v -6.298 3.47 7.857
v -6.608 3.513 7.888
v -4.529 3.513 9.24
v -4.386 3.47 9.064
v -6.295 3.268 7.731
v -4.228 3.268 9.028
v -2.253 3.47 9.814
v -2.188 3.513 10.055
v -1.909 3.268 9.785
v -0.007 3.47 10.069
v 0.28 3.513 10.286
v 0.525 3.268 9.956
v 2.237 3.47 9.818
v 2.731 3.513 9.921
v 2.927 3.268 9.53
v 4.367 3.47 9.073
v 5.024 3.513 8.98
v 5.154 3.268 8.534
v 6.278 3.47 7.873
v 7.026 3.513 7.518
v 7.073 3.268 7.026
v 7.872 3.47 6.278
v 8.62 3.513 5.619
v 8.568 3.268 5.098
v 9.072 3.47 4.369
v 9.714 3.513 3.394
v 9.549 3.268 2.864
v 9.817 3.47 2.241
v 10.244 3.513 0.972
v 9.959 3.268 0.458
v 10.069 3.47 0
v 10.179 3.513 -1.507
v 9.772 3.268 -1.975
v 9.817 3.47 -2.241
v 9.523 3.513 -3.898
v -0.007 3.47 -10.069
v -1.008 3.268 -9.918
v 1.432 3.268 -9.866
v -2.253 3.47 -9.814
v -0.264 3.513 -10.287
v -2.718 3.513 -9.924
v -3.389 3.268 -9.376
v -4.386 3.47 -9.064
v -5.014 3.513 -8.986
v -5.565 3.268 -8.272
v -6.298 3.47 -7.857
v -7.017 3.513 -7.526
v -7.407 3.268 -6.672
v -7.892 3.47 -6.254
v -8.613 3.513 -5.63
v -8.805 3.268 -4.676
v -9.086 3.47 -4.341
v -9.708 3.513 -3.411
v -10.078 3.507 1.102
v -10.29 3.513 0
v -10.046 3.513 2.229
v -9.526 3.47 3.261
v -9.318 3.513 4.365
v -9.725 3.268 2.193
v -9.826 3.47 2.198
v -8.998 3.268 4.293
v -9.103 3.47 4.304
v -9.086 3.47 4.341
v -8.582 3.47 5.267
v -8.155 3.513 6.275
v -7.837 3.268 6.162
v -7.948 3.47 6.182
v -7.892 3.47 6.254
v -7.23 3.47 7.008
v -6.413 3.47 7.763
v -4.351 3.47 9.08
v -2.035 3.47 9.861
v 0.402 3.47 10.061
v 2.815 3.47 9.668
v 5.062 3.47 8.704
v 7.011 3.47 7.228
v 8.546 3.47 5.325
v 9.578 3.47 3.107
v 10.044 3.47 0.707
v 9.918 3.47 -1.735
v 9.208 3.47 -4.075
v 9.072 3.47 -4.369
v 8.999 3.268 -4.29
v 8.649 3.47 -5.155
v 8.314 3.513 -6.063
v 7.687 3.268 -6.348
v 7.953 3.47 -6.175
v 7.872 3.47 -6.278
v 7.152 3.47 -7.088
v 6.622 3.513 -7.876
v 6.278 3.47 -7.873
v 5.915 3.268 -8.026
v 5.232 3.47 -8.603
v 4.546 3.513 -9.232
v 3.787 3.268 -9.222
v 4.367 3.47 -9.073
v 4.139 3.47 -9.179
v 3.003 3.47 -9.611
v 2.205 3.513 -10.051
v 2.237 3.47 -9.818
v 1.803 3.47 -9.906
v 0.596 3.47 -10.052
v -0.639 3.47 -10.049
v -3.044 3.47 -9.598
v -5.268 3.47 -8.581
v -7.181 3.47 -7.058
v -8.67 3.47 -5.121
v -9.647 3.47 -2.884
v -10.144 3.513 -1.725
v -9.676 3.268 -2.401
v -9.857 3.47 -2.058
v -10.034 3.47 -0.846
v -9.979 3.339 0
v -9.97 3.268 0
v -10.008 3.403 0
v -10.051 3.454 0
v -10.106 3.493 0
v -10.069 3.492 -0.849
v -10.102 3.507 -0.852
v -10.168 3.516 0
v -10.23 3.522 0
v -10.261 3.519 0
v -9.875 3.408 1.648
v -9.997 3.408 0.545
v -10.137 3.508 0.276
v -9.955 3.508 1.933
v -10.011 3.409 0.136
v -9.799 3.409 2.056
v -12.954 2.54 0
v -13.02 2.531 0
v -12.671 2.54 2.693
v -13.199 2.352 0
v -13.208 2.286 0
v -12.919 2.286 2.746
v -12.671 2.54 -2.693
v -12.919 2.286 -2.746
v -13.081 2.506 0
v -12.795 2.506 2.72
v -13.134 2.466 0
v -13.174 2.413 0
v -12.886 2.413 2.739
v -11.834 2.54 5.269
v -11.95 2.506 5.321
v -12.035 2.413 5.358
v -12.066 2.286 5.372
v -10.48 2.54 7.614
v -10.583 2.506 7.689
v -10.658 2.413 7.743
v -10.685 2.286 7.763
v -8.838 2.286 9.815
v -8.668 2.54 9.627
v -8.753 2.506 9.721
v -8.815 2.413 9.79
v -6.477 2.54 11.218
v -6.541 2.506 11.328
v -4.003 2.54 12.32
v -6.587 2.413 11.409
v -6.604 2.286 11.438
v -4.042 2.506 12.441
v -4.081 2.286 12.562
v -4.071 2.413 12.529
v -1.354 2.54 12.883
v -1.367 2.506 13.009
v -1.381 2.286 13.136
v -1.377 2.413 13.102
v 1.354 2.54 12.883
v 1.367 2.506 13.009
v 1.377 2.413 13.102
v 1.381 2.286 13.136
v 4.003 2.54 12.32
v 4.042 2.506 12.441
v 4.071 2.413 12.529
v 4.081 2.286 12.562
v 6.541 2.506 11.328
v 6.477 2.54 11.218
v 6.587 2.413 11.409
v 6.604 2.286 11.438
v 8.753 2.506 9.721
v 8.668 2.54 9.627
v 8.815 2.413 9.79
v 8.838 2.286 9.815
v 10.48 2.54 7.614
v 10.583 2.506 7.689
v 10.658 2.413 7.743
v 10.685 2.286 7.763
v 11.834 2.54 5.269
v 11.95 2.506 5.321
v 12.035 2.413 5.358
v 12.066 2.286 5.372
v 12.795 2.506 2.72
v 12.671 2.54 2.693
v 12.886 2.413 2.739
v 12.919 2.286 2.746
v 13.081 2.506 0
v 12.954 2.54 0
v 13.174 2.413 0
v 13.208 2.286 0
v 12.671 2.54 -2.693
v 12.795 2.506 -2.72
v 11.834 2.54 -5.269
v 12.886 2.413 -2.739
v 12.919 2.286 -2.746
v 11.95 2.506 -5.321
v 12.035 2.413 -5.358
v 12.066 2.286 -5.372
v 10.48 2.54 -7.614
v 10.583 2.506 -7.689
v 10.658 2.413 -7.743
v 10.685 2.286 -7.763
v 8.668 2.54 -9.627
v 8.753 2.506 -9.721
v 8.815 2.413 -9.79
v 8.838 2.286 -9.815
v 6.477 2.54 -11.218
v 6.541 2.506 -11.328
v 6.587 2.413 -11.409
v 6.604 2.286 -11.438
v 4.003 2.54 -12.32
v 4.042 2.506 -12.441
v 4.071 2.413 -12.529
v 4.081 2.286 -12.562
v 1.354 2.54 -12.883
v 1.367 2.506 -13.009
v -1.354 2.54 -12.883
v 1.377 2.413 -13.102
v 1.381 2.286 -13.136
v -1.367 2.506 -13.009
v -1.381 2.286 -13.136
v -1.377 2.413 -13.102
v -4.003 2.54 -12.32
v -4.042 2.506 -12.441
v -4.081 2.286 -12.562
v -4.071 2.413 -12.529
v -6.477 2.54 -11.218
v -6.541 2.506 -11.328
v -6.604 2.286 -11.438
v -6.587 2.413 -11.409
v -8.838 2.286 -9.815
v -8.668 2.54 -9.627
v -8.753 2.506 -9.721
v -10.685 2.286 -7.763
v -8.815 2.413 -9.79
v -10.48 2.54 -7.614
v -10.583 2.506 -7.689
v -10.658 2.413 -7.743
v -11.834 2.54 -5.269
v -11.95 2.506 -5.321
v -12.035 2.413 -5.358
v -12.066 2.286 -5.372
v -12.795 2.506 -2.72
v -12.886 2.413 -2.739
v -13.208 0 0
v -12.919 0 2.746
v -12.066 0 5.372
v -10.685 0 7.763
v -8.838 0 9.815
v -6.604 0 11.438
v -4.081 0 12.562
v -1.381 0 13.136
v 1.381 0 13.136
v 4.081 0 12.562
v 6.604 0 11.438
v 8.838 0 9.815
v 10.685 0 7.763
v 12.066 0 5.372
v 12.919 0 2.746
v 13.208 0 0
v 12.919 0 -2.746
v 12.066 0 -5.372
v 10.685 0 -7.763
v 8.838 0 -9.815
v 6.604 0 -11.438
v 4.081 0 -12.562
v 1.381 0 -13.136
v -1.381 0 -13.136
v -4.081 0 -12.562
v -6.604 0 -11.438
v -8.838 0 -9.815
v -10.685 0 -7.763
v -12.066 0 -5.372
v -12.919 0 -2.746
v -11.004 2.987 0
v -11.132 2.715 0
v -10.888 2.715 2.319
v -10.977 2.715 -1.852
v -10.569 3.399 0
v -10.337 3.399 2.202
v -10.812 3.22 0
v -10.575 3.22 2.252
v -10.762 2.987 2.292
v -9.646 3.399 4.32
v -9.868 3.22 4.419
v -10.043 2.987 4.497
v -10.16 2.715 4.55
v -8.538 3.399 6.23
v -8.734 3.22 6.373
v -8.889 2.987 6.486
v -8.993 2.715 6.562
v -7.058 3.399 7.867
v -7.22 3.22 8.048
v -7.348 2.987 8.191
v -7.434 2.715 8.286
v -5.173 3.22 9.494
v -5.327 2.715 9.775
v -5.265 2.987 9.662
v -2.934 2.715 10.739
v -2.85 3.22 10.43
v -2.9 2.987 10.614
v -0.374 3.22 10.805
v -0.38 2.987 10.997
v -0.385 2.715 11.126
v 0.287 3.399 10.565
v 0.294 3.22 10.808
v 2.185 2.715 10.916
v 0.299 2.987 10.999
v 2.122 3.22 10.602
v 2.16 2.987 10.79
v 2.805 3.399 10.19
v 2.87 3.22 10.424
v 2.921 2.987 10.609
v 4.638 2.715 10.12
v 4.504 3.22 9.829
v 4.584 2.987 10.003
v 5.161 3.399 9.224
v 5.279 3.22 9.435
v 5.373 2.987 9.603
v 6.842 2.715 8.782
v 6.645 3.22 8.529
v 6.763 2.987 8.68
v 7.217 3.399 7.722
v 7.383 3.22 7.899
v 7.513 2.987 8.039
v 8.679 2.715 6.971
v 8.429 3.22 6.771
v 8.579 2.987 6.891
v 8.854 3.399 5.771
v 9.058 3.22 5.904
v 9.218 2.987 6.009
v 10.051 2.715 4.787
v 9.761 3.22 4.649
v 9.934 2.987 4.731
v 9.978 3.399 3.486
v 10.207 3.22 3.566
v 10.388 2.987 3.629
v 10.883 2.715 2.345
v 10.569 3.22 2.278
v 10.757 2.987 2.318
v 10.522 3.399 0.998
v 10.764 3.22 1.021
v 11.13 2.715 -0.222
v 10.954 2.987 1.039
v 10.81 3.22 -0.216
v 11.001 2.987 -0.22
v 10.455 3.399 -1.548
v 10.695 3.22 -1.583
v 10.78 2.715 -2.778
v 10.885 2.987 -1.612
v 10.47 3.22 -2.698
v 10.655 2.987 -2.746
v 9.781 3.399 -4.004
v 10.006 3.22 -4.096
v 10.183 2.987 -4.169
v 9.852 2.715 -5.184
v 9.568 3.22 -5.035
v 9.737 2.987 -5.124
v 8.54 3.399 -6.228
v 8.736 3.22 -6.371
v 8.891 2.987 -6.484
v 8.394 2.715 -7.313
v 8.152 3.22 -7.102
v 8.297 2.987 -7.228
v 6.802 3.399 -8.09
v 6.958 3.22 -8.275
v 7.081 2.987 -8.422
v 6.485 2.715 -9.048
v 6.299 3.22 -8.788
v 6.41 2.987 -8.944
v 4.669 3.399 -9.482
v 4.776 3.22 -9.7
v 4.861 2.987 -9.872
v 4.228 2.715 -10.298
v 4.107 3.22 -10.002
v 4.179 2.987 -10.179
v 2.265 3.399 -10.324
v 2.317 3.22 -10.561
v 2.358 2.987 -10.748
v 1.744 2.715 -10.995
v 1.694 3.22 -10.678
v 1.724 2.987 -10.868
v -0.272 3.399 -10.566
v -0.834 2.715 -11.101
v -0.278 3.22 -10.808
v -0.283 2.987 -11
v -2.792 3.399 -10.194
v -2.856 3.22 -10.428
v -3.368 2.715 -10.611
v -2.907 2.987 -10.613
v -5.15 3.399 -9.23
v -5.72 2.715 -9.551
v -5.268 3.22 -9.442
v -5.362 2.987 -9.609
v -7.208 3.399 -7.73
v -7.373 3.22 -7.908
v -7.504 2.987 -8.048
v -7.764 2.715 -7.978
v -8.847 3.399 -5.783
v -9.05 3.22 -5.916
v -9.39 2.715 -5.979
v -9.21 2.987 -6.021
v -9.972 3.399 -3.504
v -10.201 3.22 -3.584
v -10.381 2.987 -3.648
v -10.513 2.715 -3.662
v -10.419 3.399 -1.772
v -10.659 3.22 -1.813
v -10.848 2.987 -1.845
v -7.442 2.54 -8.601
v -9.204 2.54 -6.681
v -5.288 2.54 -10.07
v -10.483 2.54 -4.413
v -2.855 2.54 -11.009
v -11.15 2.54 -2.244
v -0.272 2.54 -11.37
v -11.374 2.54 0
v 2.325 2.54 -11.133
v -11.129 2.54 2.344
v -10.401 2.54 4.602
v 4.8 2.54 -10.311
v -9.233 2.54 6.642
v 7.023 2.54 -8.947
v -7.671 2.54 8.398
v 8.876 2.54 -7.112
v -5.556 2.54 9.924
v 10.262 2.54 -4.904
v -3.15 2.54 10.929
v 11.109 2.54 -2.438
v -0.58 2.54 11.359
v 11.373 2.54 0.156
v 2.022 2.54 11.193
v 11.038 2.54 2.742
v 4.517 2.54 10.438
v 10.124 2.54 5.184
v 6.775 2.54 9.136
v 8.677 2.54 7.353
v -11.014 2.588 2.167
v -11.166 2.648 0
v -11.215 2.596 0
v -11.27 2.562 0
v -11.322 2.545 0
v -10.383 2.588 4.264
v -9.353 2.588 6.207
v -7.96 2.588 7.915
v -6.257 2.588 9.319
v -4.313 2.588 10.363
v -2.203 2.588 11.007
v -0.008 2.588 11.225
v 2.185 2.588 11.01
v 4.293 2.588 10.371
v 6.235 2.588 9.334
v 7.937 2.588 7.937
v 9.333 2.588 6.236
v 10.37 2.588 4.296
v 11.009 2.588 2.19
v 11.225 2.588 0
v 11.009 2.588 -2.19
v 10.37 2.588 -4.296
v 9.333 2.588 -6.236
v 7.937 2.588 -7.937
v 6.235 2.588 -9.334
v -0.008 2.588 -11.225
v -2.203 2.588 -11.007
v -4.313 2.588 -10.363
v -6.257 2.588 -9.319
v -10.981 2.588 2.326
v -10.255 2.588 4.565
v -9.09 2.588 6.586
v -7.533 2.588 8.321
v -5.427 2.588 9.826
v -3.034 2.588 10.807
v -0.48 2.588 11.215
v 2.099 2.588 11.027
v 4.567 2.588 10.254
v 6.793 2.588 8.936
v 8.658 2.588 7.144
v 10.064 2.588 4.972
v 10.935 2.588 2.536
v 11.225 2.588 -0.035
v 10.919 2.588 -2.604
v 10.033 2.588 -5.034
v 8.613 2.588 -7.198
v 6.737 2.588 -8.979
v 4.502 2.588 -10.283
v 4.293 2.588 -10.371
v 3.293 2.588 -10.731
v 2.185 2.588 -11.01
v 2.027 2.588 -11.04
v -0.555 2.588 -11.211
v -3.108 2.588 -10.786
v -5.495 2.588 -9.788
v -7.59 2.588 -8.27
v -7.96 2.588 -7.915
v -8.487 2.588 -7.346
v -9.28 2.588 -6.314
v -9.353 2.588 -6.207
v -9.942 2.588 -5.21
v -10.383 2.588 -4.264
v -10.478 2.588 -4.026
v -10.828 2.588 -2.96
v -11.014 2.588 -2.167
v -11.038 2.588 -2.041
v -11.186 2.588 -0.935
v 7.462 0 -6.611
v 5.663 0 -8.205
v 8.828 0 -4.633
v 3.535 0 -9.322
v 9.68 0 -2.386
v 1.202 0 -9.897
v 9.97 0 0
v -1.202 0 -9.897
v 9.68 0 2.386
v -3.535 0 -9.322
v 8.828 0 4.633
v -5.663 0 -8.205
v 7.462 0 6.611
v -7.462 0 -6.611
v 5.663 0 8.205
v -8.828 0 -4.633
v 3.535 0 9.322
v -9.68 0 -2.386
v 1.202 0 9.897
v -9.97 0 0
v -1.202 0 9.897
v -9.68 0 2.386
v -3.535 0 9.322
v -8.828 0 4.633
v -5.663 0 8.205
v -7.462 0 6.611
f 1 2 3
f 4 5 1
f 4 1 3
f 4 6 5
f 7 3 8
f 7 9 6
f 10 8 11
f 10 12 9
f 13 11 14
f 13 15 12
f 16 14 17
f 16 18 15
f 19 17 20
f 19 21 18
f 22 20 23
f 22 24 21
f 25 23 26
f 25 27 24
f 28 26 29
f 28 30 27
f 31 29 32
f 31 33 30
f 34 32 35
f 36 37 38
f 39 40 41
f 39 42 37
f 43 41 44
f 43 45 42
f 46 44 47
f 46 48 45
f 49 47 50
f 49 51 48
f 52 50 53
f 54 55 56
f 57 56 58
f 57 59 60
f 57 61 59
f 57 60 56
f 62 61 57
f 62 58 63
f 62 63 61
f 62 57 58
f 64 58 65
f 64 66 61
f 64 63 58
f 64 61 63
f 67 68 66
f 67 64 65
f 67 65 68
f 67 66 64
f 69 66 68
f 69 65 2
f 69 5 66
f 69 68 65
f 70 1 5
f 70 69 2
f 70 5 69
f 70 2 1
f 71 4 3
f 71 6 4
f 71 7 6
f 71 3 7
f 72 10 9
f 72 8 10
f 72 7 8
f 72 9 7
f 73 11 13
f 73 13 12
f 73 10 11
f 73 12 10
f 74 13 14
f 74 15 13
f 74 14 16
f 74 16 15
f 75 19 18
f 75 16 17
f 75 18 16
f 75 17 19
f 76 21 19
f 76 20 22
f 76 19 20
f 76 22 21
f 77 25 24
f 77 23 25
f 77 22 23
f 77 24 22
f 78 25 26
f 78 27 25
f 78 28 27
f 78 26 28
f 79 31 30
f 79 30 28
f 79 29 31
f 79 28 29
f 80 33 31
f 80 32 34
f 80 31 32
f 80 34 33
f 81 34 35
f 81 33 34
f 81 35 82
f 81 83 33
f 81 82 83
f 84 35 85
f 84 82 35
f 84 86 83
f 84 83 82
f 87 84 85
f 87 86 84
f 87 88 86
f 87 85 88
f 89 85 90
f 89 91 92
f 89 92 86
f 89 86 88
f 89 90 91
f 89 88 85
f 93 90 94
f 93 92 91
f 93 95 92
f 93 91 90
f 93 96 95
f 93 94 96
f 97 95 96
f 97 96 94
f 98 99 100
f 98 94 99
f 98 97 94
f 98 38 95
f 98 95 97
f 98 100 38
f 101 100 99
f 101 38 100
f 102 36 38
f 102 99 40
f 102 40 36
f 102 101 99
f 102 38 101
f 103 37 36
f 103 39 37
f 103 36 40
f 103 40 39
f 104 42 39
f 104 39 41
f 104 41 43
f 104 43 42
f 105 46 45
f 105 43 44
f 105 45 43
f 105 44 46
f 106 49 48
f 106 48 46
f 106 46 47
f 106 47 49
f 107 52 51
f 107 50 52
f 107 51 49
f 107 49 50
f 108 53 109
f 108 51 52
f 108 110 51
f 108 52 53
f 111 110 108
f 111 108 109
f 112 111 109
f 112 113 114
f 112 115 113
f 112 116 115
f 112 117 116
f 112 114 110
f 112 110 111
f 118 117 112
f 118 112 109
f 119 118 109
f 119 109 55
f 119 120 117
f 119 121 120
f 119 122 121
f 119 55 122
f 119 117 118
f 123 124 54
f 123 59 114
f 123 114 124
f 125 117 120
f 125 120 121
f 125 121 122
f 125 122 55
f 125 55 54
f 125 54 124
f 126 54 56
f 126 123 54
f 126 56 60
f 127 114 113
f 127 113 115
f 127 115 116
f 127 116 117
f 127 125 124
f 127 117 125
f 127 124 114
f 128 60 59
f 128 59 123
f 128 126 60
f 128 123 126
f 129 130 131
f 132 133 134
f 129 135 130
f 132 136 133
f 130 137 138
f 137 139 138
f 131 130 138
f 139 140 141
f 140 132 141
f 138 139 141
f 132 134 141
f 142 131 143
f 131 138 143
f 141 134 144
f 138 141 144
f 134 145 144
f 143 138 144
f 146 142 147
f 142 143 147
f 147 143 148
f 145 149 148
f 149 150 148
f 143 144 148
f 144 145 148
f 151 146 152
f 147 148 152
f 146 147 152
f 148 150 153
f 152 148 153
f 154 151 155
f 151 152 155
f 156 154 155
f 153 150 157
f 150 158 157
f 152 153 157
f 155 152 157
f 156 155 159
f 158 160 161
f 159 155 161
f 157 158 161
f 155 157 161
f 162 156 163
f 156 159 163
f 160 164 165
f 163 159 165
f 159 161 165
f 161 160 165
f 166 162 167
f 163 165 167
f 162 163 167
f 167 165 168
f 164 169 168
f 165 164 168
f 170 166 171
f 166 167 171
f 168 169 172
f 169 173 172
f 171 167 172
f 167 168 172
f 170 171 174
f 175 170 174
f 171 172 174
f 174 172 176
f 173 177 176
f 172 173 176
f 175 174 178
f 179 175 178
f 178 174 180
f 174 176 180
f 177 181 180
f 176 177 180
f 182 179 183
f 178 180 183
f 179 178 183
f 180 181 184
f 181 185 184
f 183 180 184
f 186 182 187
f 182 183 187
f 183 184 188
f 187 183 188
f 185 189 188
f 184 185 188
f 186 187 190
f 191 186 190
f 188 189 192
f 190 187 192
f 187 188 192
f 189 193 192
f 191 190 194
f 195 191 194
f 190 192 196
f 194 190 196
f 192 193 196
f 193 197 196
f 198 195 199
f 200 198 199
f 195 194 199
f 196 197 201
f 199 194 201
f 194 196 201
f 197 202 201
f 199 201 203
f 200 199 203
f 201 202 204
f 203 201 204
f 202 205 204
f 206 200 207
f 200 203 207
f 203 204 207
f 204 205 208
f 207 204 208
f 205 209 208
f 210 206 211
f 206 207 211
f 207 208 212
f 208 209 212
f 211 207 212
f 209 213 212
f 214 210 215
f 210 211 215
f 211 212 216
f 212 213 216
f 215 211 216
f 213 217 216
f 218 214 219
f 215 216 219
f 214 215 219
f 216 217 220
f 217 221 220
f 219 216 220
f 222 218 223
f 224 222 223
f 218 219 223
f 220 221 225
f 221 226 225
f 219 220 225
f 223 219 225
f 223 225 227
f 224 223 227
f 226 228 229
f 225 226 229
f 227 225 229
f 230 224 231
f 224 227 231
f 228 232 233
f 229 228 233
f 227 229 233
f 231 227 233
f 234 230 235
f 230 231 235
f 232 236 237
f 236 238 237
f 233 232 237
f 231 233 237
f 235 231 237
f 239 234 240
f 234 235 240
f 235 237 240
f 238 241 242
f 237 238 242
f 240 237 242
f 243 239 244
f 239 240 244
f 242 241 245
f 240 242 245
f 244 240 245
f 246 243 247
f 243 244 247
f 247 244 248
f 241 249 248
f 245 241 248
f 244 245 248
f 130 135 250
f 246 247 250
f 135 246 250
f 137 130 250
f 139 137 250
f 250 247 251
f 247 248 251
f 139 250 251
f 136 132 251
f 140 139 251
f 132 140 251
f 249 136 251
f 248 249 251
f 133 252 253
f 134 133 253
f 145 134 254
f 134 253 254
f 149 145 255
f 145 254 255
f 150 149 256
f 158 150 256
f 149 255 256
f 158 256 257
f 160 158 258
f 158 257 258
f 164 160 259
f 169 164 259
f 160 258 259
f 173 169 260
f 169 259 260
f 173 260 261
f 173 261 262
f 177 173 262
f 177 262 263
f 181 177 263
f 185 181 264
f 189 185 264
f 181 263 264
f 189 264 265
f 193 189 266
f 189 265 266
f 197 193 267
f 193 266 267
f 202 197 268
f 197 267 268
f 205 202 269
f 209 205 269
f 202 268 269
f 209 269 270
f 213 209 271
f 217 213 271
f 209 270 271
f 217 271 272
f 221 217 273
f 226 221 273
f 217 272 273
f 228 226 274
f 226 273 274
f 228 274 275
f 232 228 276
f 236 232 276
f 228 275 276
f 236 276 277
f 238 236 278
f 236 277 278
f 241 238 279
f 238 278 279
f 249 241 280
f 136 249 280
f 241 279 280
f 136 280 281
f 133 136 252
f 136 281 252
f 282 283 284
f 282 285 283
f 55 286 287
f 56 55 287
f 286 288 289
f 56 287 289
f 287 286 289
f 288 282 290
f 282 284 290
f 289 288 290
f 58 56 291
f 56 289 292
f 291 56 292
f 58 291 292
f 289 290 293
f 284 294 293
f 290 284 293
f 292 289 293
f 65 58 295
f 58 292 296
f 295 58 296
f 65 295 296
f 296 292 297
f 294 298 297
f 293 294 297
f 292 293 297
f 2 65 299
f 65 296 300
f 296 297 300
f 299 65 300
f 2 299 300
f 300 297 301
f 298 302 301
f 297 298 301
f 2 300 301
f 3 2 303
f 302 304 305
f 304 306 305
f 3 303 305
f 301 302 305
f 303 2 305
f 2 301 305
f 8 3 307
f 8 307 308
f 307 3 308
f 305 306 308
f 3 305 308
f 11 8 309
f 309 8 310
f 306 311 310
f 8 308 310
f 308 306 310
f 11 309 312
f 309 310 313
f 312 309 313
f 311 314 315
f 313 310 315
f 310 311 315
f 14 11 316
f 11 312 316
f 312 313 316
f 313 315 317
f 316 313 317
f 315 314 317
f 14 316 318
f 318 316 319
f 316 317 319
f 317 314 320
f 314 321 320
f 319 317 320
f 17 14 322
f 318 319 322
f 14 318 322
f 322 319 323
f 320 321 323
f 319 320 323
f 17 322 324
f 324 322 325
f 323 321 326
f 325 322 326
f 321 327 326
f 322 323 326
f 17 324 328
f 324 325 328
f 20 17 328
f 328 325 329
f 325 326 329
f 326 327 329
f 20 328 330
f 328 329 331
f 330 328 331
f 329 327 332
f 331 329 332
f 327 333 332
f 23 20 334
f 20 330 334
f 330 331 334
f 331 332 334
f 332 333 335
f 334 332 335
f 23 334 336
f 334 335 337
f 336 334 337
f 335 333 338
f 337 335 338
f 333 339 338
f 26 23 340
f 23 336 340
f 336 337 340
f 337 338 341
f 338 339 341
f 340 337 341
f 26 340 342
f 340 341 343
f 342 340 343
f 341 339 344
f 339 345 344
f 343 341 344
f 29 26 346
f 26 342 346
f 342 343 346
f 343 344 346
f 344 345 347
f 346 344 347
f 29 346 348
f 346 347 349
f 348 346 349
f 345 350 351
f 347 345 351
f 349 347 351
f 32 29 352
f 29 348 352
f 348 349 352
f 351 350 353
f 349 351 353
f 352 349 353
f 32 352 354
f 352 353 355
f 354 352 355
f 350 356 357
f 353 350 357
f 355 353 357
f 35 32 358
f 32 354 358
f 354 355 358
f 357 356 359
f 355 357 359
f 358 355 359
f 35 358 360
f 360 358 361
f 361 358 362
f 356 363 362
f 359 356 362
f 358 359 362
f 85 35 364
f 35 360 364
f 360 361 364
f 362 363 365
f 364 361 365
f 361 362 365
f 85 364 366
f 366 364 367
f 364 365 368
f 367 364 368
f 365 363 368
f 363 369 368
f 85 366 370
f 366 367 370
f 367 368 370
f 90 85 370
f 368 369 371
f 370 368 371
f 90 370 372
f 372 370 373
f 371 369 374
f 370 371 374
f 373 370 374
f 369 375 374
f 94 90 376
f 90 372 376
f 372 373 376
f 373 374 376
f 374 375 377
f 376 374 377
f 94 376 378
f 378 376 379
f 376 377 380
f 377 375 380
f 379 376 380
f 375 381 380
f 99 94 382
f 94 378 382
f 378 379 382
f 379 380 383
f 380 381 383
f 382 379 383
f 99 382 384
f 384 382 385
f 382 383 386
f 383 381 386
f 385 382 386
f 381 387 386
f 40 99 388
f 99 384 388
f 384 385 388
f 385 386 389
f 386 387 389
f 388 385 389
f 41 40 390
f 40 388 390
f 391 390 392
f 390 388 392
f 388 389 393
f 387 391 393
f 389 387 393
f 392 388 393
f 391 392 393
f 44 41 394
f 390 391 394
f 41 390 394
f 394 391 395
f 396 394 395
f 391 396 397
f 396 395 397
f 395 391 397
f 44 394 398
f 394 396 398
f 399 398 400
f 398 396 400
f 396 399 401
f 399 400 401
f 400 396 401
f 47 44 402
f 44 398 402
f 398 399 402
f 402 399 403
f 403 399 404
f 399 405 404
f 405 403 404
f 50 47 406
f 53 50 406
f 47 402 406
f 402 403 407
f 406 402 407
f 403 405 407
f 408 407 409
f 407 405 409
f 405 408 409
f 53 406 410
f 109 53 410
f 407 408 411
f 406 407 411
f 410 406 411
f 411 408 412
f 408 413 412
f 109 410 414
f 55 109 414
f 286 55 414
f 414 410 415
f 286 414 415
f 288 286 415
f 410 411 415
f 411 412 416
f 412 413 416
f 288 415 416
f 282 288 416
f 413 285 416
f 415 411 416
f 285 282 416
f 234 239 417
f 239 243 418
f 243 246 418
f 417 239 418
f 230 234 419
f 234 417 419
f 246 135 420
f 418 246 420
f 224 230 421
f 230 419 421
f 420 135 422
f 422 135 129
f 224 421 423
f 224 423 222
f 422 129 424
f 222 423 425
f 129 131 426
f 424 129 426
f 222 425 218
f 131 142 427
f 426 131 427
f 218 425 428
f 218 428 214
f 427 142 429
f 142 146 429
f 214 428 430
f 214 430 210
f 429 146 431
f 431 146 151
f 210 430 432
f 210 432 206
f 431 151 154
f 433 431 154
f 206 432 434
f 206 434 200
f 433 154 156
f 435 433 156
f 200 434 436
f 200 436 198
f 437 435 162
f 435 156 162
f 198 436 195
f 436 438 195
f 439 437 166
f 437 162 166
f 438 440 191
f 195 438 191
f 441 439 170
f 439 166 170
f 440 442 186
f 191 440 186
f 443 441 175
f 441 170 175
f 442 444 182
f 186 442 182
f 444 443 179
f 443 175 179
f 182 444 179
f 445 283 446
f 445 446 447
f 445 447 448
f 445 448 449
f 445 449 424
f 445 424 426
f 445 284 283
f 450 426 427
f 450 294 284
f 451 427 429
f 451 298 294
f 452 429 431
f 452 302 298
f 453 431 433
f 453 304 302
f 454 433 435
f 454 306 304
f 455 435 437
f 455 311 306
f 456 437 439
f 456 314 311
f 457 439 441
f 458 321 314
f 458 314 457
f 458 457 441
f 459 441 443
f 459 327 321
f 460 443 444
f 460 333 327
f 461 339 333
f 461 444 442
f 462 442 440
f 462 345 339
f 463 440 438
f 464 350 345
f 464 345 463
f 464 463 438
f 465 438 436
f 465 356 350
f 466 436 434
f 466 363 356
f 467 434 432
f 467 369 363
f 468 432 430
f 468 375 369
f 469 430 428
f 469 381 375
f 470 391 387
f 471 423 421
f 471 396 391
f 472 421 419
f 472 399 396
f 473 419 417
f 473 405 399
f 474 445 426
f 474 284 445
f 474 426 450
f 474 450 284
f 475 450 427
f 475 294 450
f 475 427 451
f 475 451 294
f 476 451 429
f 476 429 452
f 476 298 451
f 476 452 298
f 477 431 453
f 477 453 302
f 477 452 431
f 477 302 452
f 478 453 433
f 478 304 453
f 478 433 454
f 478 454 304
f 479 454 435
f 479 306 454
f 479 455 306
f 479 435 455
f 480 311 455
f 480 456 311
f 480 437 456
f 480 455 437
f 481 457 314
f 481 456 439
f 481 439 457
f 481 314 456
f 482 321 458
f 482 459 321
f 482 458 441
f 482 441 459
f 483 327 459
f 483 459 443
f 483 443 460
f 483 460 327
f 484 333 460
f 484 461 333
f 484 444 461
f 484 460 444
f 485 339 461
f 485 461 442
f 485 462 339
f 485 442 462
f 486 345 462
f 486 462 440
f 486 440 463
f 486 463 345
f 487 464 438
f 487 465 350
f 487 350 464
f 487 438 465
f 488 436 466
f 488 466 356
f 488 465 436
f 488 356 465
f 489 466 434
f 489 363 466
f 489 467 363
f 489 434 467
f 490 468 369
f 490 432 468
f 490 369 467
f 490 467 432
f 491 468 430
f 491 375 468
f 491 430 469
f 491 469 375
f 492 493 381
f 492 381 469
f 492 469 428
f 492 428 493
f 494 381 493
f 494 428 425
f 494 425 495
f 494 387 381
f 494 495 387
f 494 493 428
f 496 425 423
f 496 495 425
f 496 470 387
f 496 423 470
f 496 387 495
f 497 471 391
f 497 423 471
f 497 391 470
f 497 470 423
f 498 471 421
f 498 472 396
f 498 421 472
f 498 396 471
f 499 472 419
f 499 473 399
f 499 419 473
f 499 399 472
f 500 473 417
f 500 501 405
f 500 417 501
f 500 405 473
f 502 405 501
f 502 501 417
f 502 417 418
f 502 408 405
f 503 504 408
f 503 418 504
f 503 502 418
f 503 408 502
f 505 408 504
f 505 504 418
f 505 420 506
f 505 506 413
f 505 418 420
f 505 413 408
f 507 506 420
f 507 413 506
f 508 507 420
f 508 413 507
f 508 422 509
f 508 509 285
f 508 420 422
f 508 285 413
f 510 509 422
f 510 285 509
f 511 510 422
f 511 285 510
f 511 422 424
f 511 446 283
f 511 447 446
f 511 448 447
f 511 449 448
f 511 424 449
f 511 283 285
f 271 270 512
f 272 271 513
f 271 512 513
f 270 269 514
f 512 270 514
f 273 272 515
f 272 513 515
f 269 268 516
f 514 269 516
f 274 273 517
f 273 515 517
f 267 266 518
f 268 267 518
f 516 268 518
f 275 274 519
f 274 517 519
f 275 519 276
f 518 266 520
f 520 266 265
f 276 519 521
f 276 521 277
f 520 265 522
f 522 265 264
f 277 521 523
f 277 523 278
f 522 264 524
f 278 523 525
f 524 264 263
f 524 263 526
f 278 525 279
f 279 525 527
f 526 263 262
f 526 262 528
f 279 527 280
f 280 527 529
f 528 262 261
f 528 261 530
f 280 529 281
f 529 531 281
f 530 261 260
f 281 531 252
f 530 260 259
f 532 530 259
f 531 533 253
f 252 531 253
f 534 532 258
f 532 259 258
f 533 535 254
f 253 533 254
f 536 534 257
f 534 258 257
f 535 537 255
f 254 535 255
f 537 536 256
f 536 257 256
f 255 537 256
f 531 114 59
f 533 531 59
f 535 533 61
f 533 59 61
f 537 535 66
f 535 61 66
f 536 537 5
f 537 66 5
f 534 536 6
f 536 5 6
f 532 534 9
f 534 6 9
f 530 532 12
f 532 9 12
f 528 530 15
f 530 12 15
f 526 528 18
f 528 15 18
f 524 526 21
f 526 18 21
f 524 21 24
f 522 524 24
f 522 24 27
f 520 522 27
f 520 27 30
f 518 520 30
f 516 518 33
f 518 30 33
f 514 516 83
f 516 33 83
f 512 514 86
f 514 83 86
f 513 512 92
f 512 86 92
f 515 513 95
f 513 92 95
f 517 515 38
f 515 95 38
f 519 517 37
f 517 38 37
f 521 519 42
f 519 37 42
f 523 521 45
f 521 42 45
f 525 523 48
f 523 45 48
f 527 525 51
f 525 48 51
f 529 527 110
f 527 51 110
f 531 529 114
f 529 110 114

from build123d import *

# Parameters (mm, degrees)
FILLET1_R = 0.254


with BuildPart() as part:
    # Sketch1 → Revolve1 (revolve)
    with BuildSketch(Plane.XY):
        with BuildLine():
            Line((-9.9695, 0), (-9.9695, 3.556))
            ThreePointArc((-9.9695, 3.556), (-10.758153639, 3.268166821), (-11.176, 2.54))
            Line((-11.176, 2.54), (-13.208, 2.54))
            Line((-13.208, 2.54), (-13.208, 0))
            Line((-13.208, 0), (-9.9695, 0))
        make_face()
    revolve(axis=Axis((0, 0, 0), (0, 1, 0)))

    # Fillet1
    fillet1_edges = [part.edges().sort_by_distance(p)[0] for p in [
        (13.208, 2.54, 0),
        (11.176, 2.54, 0),
        (9.9695, 3.556, 0),
    ]]
    fillet(fillet1_edges, radius=FILLET1_R)


solid = part.part
